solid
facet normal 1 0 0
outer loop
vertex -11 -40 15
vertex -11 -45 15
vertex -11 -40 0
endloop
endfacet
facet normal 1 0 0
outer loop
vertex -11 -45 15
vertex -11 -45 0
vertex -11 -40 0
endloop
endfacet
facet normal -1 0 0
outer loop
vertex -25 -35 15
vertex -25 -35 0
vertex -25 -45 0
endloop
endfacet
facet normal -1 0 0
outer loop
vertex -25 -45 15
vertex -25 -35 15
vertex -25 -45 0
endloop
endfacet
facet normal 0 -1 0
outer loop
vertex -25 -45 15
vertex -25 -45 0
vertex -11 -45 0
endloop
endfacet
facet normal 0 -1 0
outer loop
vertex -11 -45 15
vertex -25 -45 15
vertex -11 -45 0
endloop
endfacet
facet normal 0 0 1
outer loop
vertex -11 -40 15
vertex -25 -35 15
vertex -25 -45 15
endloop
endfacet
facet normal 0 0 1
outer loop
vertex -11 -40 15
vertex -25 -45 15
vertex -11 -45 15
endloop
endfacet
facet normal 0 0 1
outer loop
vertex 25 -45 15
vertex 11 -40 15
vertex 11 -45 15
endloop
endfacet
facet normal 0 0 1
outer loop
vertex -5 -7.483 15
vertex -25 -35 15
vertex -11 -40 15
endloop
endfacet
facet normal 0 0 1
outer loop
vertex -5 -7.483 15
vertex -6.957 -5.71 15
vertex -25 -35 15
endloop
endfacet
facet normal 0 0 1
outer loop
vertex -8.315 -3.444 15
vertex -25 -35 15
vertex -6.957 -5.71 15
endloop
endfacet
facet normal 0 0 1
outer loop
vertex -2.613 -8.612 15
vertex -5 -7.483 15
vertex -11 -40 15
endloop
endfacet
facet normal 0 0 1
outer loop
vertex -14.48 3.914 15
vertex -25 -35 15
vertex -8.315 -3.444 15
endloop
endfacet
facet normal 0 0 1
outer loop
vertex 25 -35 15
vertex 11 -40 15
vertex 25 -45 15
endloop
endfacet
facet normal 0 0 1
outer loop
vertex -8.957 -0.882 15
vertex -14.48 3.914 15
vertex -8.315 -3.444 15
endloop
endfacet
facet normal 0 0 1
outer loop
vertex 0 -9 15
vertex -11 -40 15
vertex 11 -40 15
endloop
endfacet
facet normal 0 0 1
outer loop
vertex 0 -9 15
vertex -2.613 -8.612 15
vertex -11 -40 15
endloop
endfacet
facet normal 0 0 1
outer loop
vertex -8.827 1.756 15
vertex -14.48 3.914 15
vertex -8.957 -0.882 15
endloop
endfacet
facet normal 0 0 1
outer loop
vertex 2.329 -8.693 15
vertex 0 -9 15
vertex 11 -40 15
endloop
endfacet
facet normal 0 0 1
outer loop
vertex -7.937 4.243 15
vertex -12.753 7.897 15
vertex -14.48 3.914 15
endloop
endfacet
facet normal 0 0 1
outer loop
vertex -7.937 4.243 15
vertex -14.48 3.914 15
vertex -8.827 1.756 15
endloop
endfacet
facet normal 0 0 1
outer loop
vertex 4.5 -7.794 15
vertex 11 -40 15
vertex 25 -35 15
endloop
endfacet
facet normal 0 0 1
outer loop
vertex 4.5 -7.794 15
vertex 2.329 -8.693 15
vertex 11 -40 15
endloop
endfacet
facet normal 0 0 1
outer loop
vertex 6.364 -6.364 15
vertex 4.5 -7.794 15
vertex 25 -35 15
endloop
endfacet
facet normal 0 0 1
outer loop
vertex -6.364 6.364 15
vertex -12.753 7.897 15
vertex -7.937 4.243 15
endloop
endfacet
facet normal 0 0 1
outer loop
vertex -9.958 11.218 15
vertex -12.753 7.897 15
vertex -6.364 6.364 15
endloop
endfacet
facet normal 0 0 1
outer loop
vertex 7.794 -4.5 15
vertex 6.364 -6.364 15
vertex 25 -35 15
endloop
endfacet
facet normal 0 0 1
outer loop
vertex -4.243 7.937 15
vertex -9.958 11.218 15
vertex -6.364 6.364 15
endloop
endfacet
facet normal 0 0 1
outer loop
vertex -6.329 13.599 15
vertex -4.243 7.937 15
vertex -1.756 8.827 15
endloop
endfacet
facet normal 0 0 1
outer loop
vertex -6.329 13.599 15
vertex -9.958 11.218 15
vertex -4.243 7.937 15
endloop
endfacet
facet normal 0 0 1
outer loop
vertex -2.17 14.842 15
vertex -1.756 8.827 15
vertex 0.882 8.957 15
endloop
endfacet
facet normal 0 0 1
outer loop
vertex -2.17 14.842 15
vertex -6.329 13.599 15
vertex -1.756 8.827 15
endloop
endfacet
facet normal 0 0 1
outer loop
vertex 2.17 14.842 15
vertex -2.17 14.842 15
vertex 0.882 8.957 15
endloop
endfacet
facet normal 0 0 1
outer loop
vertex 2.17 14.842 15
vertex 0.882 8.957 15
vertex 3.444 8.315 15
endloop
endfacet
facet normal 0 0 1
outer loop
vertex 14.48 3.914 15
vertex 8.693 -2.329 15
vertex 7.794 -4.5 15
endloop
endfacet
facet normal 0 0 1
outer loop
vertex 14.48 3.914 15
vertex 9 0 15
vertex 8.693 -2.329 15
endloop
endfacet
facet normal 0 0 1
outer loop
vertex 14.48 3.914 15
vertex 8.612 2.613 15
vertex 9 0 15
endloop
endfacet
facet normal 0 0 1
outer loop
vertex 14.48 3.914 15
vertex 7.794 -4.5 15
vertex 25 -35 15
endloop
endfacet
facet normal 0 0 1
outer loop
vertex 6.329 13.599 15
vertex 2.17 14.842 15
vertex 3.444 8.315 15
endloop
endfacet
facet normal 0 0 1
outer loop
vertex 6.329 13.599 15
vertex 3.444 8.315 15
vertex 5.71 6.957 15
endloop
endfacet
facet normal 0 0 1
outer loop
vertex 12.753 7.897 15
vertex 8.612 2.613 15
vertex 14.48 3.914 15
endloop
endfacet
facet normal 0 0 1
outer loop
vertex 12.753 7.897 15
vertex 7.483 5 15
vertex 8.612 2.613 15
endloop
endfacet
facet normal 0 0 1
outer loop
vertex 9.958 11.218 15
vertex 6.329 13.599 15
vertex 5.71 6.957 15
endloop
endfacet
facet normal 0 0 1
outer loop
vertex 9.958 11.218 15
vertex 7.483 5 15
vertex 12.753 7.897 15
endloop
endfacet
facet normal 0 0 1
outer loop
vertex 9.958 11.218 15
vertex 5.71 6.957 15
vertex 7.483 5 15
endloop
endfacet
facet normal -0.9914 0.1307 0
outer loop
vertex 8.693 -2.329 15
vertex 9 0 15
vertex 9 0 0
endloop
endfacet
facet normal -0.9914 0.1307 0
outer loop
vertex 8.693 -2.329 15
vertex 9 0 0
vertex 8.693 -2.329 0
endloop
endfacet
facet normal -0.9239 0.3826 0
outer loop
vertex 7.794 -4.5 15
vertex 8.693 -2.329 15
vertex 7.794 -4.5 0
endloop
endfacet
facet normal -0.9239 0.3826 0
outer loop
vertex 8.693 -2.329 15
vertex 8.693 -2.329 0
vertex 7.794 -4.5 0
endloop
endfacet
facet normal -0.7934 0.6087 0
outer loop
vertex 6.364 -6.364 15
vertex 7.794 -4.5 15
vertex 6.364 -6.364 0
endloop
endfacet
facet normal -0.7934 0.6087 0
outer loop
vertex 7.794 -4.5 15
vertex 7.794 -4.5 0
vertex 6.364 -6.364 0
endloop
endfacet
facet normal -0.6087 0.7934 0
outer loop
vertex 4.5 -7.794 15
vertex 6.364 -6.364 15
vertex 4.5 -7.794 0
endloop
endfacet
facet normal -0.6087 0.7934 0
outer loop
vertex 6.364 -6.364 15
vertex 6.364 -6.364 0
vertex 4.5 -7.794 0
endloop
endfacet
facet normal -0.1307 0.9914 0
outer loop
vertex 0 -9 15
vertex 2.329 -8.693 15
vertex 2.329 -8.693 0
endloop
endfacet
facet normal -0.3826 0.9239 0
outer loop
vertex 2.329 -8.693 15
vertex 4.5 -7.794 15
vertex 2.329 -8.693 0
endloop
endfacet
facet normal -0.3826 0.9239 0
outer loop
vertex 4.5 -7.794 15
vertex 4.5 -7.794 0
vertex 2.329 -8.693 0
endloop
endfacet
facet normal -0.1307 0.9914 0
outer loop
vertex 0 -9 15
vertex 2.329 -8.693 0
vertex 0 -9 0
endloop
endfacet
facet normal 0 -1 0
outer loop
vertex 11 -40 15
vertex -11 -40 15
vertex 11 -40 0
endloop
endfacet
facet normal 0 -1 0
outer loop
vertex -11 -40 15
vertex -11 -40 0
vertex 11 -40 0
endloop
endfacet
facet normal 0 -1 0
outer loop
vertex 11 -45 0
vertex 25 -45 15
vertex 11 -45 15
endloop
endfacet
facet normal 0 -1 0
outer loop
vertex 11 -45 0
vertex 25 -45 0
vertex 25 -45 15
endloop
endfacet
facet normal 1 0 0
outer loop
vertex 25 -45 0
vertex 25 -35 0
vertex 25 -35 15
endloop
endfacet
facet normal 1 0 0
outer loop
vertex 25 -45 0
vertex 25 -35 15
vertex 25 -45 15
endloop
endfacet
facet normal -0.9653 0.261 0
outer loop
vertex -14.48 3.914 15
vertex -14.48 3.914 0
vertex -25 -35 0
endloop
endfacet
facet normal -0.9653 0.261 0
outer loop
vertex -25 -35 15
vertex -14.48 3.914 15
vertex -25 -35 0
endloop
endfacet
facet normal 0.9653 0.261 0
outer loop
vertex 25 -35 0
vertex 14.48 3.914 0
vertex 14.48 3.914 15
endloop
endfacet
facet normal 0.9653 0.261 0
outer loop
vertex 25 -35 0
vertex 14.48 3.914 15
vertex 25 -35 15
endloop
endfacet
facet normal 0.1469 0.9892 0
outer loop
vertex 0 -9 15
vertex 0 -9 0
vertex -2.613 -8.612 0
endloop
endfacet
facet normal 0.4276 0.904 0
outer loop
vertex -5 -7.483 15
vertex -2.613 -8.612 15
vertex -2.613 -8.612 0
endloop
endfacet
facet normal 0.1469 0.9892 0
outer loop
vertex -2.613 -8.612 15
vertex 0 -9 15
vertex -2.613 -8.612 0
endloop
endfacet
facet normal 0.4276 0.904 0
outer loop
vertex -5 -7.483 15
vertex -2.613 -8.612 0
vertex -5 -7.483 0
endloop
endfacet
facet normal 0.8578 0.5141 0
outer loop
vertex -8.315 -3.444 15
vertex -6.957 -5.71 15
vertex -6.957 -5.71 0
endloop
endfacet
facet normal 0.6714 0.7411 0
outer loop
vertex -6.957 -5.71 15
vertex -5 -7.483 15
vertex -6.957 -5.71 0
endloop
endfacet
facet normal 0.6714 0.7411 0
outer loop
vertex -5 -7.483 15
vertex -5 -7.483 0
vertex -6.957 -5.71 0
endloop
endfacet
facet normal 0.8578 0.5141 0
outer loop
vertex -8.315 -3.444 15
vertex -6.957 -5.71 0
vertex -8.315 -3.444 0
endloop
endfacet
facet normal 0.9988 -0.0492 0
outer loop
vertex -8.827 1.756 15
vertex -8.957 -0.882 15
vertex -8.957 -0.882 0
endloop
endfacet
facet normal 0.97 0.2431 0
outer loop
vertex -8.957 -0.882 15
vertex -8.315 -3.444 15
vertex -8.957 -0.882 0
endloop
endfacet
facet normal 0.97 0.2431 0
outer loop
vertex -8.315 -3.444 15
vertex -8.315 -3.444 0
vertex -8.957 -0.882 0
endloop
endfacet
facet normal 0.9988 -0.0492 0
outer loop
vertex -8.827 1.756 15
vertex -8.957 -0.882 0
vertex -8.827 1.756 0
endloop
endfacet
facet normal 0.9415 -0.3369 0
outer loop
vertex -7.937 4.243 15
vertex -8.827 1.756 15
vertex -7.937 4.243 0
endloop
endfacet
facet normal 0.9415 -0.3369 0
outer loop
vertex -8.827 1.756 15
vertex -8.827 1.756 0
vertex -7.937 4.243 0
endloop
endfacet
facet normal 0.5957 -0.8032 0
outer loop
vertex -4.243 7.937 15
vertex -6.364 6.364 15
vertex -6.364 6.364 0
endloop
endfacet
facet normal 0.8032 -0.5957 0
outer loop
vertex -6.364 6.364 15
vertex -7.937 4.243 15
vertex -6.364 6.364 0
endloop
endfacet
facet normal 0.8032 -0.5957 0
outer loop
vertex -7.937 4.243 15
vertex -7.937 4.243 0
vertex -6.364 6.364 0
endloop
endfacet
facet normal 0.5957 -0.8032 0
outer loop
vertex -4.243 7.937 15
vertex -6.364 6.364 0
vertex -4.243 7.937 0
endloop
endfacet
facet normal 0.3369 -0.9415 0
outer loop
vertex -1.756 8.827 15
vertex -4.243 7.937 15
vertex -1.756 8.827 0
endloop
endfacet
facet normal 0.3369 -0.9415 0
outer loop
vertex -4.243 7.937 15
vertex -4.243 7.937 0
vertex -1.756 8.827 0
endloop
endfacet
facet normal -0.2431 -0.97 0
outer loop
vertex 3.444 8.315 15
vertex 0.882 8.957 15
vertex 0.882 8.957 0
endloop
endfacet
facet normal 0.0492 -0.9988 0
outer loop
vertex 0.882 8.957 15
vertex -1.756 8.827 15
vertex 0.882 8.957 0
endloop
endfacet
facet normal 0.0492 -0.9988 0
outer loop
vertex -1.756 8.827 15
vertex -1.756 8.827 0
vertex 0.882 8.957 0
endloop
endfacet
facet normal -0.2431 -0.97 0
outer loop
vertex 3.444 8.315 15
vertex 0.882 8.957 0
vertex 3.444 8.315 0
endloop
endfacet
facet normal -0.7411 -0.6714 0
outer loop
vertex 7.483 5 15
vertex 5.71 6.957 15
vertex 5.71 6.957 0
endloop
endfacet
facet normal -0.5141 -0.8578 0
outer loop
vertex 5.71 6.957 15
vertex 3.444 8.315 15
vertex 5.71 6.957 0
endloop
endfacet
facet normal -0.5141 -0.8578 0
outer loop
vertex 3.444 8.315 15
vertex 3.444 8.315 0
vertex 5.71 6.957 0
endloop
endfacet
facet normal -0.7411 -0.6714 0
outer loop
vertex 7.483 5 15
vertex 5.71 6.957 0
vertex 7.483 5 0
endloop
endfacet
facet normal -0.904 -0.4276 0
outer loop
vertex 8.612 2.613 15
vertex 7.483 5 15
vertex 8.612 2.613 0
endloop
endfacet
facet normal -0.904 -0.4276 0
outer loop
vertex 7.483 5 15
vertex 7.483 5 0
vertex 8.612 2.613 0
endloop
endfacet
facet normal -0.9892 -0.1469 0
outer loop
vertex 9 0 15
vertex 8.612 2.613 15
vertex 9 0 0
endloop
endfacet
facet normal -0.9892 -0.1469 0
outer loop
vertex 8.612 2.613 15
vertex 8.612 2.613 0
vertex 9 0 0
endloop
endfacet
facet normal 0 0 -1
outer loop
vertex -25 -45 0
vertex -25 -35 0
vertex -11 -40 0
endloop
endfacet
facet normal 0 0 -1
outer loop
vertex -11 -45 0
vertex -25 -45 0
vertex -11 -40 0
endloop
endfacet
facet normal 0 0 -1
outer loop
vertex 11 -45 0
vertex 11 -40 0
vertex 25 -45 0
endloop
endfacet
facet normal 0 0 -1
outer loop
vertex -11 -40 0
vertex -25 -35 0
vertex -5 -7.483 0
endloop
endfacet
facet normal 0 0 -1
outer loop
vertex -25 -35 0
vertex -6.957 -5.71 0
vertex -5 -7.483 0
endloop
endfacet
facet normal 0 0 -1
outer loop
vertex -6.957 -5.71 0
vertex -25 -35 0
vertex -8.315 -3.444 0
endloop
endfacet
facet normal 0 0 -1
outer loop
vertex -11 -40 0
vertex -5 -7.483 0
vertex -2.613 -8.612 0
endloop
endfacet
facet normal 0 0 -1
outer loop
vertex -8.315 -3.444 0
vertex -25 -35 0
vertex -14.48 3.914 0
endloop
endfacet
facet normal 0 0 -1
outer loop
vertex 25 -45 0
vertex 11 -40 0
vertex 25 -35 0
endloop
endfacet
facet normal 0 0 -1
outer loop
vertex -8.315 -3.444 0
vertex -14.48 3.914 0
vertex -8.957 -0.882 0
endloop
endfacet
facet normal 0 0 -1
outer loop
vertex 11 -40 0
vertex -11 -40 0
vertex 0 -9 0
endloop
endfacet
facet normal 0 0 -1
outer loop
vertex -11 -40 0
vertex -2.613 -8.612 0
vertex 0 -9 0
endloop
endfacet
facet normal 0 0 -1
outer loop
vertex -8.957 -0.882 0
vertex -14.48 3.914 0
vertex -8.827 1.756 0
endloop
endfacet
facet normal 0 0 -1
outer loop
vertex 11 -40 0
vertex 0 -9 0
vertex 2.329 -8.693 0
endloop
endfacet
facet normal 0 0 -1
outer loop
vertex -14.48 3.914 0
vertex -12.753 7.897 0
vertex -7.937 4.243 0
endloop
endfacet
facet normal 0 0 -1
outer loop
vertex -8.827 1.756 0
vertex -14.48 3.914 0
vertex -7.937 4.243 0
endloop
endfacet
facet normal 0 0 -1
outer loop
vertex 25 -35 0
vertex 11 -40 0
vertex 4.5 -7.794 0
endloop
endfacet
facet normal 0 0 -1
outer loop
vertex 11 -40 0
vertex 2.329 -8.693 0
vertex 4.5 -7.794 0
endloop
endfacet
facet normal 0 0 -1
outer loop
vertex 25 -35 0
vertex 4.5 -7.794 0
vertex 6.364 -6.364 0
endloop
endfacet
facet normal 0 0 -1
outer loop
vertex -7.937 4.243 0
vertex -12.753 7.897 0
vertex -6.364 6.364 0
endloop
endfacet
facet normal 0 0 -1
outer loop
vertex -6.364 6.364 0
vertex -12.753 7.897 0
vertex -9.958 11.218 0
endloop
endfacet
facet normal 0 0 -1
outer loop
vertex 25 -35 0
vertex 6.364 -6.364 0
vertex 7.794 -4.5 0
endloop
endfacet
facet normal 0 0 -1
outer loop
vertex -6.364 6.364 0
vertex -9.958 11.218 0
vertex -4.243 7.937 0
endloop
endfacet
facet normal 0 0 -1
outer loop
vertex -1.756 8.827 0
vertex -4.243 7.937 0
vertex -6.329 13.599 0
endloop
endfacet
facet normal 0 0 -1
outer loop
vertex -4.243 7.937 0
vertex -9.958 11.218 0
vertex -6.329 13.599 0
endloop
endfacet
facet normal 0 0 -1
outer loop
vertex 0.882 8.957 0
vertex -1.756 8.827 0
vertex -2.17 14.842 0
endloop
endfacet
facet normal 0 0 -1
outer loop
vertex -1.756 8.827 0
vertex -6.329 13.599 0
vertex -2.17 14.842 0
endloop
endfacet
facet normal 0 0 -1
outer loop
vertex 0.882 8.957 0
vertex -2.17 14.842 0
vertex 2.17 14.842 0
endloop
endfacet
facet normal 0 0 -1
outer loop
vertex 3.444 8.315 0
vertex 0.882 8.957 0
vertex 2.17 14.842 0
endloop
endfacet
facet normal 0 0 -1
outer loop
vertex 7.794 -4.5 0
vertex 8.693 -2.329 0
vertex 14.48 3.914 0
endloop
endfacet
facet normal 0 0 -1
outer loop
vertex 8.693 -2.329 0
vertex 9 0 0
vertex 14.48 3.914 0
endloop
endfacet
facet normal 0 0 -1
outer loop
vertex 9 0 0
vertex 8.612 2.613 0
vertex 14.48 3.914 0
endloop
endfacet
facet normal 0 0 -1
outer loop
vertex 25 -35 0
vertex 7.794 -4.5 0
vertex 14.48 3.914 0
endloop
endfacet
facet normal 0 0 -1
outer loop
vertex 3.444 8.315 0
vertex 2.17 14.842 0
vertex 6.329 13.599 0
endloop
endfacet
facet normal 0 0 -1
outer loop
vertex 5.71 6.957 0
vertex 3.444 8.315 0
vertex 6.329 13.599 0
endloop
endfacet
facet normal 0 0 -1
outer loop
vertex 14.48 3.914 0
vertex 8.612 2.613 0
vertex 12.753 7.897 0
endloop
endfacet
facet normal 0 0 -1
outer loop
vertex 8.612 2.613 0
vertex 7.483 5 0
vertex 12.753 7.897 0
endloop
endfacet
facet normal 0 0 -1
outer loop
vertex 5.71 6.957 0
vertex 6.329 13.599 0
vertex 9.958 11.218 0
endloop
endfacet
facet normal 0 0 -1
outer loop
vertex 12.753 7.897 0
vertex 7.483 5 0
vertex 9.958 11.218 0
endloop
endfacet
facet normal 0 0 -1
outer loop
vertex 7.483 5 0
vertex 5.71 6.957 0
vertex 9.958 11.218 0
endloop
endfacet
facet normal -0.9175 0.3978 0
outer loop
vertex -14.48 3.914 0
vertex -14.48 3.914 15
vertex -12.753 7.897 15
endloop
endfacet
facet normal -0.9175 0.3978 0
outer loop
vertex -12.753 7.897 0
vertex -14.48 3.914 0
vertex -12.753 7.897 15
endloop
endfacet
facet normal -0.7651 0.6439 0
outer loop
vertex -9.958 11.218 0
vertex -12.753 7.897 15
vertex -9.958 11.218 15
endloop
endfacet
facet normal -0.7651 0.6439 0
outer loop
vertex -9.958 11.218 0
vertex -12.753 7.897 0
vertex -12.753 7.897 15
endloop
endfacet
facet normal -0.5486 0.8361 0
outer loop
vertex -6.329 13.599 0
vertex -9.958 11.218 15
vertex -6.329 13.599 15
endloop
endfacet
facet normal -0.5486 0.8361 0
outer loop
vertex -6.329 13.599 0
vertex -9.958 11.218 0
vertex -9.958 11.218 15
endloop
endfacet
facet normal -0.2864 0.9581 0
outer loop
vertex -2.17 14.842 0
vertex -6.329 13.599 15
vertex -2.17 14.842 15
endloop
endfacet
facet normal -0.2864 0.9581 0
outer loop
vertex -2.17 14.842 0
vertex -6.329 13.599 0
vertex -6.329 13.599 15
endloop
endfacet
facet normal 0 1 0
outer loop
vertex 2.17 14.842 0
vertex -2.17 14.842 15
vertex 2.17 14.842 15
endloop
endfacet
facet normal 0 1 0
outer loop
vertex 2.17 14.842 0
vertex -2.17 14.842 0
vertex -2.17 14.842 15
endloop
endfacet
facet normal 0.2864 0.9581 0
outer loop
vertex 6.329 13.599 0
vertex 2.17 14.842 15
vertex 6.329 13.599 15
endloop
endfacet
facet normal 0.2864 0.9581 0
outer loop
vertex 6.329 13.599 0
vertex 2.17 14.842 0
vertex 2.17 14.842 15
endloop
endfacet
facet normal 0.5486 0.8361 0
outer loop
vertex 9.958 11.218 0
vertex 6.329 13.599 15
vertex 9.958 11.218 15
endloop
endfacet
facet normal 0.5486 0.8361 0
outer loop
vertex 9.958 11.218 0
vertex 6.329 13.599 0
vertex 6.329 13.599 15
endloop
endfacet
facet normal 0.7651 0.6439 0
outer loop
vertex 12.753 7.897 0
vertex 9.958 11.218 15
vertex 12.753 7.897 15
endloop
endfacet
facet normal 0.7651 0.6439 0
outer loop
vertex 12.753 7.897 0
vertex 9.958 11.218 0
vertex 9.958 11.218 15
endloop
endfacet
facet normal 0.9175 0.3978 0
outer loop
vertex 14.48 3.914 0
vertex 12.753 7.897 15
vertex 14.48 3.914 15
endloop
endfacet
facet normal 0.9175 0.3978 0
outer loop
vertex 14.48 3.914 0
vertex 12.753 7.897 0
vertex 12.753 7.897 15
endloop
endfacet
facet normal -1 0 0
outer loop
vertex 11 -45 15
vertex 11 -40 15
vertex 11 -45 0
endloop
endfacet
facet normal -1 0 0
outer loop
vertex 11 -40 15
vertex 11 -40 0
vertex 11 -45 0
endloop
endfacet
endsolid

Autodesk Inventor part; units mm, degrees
ref_plane "YZ Plane" through (0, 0, 0) normal (1, 0, 0) x (0, 1, 0)
ref_plane "XZ Plane" through (0, 0, 0) normal (0, 1, 0) x (-1, 0, 0)
ref_plane "XY Plane" through (0, 0, 0) normal (0, 0, 1) x (1, 0, 0)
sketch "草图1" plane through (0, 0, 0) normal (0, 0, 1) x (1, 0, 0)
  line L0 (0, 7.9673) -> (0, -10.1658)
  circle A0 centre (0, 0) radius 9
  line L1 (-14.4802, 3.9145) -> (-25, -35)
  line L2 (14.4802, 3.9145) -> (25, -35)
  line L3 (-25, -35) -> (-25, -45)
  line L4 (-25, -45) -> (-11, -45)
  line L5 (-11, -45) -> (-11, -40)
  line L6 (-11, -40) -> (11, -40)
  line L7 (11, -40) -> (11, -45)
  line L8 (25, -45) -> (11, -45)
  line L9 (25, -35) -> (25, -45)
  arc A1 (14.4802, 3.9145) -> (-14.4802, 3.9145) centre (0, 0) ccw
  dimension "d1" = 18
  dimension "d2" = 22
  dimension "d3" = 50
  dimension "d4" = 5
  dimension "d5" = 10
  dimension "d6" = 45
  dimension "d7" = 15
extrude "拉伸1" add sketch "草图1" along normal blind 15
